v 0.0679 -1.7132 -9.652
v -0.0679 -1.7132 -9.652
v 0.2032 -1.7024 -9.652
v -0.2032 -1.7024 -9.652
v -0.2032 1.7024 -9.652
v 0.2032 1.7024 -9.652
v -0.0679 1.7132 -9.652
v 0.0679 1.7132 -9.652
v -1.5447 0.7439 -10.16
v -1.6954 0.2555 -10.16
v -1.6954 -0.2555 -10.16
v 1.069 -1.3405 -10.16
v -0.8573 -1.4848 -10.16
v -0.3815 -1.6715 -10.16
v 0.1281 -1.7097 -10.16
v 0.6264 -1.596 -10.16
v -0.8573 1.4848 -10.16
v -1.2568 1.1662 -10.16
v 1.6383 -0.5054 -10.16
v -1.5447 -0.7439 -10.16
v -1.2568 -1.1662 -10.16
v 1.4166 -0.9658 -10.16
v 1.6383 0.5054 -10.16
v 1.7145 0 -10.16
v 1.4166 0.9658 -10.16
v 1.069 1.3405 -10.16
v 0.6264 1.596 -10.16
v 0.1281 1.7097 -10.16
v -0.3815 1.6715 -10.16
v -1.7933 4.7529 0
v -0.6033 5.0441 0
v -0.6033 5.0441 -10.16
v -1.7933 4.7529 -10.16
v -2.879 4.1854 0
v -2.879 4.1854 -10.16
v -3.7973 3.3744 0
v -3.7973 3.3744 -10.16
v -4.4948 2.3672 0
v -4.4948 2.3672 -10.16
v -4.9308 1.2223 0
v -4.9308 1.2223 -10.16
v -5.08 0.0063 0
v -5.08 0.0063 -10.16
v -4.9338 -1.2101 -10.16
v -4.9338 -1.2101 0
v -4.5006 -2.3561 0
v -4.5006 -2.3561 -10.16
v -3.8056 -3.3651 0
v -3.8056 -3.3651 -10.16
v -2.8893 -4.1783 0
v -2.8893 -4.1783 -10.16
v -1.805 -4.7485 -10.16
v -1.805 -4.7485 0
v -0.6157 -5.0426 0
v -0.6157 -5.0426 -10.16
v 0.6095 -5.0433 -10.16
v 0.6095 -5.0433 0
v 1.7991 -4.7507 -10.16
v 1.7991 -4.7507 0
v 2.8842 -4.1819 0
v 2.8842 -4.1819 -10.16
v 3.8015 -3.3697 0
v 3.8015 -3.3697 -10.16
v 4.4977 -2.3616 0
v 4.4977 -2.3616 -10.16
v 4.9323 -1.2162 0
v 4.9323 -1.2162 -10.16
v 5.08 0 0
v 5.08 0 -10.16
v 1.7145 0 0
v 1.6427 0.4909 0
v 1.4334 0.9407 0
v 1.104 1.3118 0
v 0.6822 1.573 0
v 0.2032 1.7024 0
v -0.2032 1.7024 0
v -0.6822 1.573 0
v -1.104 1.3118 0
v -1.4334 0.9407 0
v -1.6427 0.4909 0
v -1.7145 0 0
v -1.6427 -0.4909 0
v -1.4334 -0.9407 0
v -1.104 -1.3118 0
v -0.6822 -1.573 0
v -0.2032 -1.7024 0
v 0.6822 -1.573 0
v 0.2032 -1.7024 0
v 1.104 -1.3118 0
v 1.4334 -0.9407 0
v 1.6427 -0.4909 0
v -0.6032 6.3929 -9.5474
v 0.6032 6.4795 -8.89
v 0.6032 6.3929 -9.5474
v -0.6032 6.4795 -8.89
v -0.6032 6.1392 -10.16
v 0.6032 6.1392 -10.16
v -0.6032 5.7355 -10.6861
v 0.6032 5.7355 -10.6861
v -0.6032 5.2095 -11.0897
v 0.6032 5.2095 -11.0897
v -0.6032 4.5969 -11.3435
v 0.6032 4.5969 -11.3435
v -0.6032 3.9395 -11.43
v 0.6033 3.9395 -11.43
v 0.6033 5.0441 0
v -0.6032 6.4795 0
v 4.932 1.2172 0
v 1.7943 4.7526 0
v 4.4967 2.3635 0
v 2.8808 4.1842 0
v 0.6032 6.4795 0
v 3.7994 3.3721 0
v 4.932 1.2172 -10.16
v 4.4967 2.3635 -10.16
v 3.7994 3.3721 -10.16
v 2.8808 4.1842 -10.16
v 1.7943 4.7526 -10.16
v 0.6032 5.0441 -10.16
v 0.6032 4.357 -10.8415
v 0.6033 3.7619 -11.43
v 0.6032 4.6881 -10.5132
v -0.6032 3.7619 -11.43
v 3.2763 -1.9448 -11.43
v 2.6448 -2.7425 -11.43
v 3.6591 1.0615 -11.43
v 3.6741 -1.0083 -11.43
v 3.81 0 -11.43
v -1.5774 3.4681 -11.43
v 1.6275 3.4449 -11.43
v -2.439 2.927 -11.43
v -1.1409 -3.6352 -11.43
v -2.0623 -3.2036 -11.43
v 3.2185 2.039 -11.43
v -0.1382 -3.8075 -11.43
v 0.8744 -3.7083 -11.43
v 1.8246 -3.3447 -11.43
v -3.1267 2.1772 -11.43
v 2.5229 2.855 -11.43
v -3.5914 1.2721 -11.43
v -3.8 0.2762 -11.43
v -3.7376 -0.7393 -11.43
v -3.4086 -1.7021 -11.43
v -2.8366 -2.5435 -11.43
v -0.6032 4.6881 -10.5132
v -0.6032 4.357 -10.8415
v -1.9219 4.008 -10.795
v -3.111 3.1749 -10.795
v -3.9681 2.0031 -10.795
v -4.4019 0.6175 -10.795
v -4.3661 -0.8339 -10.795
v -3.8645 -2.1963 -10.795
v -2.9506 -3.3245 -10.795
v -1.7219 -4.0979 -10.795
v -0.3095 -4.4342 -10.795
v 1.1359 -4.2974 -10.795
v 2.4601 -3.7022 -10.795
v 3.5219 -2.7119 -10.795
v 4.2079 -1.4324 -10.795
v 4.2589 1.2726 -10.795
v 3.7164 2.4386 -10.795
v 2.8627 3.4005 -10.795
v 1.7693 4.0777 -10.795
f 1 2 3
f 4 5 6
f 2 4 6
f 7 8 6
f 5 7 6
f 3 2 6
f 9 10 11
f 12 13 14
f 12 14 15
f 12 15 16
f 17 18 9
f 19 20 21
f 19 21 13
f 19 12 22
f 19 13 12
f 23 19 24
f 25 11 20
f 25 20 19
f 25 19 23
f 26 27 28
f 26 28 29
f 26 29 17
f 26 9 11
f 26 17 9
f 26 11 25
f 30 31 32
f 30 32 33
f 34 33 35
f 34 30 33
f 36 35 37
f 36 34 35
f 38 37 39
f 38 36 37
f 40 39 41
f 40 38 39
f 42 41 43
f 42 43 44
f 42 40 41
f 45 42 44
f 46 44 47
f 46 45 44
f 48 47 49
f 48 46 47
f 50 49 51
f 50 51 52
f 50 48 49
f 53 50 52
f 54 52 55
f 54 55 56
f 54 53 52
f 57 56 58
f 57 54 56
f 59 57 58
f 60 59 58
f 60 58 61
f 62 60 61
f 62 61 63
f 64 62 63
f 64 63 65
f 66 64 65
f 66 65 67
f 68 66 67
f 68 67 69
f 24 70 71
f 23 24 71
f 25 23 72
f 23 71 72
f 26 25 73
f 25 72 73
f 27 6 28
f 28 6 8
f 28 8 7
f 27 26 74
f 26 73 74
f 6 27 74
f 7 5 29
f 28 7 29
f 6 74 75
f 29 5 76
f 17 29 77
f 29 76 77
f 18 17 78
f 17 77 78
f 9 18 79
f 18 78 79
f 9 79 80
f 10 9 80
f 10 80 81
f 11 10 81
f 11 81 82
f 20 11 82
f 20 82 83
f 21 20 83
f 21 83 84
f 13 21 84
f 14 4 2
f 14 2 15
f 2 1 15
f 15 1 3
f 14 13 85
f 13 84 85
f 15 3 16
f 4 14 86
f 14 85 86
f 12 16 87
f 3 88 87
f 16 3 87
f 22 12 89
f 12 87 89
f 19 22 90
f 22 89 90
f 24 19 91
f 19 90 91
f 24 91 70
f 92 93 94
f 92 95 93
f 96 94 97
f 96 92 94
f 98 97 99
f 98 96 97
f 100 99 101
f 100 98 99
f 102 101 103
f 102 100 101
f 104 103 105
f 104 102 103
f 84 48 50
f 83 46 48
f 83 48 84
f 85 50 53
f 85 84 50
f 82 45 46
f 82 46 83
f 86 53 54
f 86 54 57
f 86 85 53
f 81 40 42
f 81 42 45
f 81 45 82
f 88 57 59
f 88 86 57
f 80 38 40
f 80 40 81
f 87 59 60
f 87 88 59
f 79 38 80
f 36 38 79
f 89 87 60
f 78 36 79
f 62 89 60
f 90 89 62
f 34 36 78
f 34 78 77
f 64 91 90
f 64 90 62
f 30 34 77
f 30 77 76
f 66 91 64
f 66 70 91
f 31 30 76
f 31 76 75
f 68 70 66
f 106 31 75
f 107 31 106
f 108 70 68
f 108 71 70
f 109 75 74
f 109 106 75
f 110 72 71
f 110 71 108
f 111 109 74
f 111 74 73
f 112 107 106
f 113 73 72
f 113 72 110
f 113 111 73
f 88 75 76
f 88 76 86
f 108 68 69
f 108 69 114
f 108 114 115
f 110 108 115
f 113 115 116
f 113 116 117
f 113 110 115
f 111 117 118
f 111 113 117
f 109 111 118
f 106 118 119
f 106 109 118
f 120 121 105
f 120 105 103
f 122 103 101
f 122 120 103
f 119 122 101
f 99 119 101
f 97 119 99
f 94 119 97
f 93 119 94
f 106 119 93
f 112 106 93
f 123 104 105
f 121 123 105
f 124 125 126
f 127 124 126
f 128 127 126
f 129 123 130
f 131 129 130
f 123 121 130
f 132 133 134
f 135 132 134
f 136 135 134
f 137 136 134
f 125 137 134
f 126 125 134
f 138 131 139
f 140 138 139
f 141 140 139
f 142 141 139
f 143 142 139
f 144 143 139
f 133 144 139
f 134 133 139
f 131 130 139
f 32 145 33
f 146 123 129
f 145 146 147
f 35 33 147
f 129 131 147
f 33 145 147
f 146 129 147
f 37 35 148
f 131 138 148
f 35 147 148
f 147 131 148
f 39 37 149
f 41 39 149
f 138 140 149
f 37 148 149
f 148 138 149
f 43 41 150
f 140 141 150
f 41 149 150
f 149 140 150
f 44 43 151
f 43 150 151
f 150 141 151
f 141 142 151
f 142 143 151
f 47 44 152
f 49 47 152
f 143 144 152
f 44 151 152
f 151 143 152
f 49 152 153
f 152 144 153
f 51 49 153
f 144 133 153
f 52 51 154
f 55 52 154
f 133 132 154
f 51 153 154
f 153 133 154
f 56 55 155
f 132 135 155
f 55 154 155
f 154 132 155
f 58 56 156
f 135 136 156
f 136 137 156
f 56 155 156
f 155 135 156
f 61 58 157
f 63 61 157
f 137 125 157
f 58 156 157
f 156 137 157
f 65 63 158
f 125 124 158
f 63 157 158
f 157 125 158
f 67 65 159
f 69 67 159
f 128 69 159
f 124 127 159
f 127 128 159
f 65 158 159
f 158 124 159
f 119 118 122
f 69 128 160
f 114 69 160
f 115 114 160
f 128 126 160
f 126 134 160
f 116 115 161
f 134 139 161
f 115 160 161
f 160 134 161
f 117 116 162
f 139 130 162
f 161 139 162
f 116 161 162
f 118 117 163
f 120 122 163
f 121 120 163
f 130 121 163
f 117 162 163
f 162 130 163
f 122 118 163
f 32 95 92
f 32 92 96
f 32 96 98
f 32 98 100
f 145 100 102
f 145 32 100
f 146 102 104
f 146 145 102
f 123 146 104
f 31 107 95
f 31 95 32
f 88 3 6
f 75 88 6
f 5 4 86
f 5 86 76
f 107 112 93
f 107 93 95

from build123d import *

# Parameters (mm, degrees)
F1_DEPTH = 11.43
F2_R     = 1.7145
F3_DEPTH = 10.16
F4_W     = 0.4064
F4_H     = 5.1579866558
F5_DEPTH = 9.652
F6_SIZE  = 1.27
F7_R     = 2.54


with BuildPart() as f1:
    # F0 (on Top) → F1 (new body)
    with BuildSketch(Plane.XY):
        with BuildLine():
            ThreePointArc((-0.60325, 5.0440548607), (-3.372083184, -3.7994019266), (5.08, 0))
            ThreePointArc((5.08, 0), (3.7994019266, 3.372083184), (0.60325, 5.0440548607))
            Line((0.60325, 5.0440548607), (0.60325, 3.6805351715))
            Line((0.60325, 3.6805351715), (-0.60325, 3.6805351715))
            Line((-0.60325, 3.6805351715), (-0.60325, 5.0440548607))
        make_face()
        with BuildLine():
            Line((0.60325, 3.6805351715), (0.60325, 5.0440548607))
            ThreePointArc((0.60325, 5.0440548607), (0, 5.08), (-0.60325, 5.0440548607))
            Line((-0.60325, 5.0440548607), (-0.60325, 3.6805351715))
            Line((-0.60325, 3.6805351715), (0.60325, 3.6805351715))
        make_face()
        with BuildLine():
            ThreePointArc((-0.60325, 5.0440548607), (0, 5.08), (0.60325, 5.0440548607))
            Line((0.60325, 5.0440548607), (0.60325, 6.4794648285))
            Line((0.60325, 6.4794648285), (-0.60325, 6.4794648285))
            Line((-0.60325, 6.4794648285), (-0.60325, 5.0440548607))
        make_face()
    extrude(amount=-F1_DEPTH)

    # F2 (on face) → F3 (cut)
    with BuildSketch(Plane.XY):
        Circle(F2_R)
    extrude(amount=-F3_DEPTH, mode=Mode.SUBTRACT)

    # F4 (on Top) → F5 (join)
    with BuildSketch(Plane.XY):
        Rectangle(F4_W, F4_H)
    extrude(amount=-F5_DEPTH)

    # F6
    f6_edges = [f1.edges().sort_by_distance(p)[0] for p in [
        (0, -5.08, -11.43),
    ]]
    chamfer(f6_edges, length=F6_SIZE)

    # F7
    f7_edges = [f1.edges().sort_by_distance(p)[0] for p in [
        (0, 6.479465, -11.43),
    ]]
    fillet(f7_edges, radius=F7_R)


solid = f1.part
